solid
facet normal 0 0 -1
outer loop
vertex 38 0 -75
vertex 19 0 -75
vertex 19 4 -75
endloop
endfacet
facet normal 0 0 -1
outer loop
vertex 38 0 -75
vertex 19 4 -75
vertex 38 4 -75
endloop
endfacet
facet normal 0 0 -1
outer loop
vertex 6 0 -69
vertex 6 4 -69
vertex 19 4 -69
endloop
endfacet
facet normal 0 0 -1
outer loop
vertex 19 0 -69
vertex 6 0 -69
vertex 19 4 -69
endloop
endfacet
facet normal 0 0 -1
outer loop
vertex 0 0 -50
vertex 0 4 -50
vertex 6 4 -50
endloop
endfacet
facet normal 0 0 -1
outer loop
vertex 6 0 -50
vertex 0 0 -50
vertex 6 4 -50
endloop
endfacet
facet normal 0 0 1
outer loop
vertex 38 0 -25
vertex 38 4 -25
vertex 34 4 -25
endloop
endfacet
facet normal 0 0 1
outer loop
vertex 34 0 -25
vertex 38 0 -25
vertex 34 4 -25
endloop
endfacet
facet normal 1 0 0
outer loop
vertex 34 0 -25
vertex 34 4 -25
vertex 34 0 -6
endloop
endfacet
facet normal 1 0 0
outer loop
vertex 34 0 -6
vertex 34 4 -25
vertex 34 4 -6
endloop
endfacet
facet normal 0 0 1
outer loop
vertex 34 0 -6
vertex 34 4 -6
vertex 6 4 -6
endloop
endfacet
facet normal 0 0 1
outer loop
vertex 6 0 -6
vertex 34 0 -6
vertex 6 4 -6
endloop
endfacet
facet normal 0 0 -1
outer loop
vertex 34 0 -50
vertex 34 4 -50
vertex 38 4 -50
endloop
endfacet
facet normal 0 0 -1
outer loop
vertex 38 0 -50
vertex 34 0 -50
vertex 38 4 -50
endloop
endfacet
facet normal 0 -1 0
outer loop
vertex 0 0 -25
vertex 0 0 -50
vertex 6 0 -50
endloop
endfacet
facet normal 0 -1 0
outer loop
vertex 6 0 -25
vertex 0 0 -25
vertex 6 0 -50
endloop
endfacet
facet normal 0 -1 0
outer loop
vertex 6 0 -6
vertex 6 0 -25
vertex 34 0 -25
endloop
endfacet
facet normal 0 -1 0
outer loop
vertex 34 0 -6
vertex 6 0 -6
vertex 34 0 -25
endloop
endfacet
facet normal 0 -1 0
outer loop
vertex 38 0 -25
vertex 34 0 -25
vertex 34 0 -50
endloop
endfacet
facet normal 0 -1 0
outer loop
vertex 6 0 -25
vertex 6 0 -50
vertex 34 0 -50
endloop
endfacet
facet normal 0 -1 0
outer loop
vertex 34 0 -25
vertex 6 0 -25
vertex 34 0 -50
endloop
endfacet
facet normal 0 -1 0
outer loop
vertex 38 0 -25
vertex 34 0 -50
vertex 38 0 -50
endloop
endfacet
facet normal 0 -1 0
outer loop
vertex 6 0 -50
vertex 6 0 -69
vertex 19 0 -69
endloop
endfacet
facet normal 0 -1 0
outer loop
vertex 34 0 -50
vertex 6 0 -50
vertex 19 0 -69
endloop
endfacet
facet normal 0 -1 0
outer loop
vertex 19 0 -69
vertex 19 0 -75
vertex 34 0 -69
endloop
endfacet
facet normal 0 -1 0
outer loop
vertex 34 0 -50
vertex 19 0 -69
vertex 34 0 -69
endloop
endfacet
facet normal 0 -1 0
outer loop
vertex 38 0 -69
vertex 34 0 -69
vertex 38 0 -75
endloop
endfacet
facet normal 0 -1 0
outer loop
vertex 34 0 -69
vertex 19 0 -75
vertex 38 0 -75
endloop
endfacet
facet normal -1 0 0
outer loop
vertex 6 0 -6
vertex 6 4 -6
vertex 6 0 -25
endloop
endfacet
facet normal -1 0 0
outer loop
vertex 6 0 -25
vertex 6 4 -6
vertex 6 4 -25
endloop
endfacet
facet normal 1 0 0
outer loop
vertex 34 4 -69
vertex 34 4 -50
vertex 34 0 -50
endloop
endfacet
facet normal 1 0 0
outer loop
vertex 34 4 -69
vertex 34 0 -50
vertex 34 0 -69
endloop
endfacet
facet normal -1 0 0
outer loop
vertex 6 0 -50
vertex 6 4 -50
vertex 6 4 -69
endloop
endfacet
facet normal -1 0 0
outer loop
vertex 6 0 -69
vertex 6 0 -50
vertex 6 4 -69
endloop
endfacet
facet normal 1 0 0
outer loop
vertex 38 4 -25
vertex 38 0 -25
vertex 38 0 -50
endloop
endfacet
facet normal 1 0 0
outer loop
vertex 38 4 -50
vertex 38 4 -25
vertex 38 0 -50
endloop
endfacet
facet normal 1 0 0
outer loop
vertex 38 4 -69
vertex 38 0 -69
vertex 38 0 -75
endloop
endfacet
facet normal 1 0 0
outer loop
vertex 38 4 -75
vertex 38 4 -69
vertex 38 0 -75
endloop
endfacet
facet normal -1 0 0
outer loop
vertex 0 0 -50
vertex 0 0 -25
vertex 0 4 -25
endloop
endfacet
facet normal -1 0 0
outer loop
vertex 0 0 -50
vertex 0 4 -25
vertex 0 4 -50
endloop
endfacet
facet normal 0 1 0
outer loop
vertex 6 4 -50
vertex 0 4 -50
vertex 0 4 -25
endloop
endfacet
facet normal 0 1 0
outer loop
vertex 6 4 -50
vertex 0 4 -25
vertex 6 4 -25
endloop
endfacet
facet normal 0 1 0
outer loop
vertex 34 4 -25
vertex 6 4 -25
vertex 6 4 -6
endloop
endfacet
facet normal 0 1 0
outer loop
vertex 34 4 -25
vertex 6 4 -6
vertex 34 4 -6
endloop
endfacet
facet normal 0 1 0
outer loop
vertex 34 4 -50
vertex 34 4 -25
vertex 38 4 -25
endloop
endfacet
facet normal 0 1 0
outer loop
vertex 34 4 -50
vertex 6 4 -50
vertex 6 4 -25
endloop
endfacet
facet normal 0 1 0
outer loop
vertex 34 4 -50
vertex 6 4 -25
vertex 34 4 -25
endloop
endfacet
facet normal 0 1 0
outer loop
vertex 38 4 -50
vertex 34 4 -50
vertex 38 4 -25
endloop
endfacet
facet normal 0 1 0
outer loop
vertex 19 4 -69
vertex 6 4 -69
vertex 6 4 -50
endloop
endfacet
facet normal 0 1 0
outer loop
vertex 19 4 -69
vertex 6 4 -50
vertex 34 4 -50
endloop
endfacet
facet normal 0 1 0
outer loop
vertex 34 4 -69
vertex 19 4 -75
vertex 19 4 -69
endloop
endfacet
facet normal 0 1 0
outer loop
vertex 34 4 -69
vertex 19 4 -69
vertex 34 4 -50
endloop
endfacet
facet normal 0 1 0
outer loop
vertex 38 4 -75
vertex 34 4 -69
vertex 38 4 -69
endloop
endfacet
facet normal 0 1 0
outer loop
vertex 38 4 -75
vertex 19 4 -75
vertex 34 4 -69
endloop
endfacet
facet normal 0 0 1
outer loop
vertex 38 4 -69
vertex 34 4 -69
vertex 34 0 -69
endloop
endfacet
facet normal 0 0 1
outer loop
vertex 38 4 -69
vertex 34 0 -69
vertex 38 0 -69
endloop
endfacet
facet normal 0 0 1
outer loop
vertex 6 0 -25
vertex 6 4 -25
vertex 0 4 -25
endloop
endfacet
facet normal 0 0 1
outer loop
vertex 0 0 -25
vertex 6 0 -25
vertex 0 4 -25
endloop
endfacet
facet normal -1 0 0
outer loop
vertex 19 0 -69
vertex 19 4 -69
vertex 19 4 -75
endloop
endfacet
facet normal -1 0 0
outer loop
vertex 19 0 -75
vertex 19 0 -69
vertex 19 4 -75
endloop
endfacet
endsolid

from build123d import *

# Parameters (mm, degrees)
SKETCH1_W           = 38
SKETCH1_H           = 75
BOSS_EXTRUDE1_DEPTH = 4
SKETCH2_W           = 4
SKETCH2_H           = 19
CUT_EXTRUDE1_DEPTH  = 85.172442046


with BuildPart() as part:
    # Sketch1 → Boss-Extrude1 (new body)
    with BuildSketch(Plane(origin=(0, 0, 0), x_dir=(1, 0, 0), z_dir=(0, 1, 0))):
        with Locations((19, 37.5)):
            Rectangle(SKETCH1_W, SKETCH1_H)
    extrude(amount=BOSS_EXTRUDE1_DEPTH)

    # Sketch2 → Cut-Extrude1 (cut, through all)
    with BuildSketch(Plane(origin=(0, 4, 0), x_dir=(1, 0, 0), z_dir=(0, 1, 0))):
        Polygon((0, 0), (38, 0), (38, 25), (34, 25), (34, 6), (6, 6), (6, 25), (0, 25), align=None)
        Polygon((0, 50), (6, 50), (6, 69), (19, 69), (19, 75), (0, 75), align=None)
        with Locations((36, 59.5)):
            Rectangle(SKETCH2_W, SKETCH2_H)
    extrude(amount=-CUT_EXTRUDE1_DEPTH, mode=Mode.SUBTRACT)


solid = part.part
